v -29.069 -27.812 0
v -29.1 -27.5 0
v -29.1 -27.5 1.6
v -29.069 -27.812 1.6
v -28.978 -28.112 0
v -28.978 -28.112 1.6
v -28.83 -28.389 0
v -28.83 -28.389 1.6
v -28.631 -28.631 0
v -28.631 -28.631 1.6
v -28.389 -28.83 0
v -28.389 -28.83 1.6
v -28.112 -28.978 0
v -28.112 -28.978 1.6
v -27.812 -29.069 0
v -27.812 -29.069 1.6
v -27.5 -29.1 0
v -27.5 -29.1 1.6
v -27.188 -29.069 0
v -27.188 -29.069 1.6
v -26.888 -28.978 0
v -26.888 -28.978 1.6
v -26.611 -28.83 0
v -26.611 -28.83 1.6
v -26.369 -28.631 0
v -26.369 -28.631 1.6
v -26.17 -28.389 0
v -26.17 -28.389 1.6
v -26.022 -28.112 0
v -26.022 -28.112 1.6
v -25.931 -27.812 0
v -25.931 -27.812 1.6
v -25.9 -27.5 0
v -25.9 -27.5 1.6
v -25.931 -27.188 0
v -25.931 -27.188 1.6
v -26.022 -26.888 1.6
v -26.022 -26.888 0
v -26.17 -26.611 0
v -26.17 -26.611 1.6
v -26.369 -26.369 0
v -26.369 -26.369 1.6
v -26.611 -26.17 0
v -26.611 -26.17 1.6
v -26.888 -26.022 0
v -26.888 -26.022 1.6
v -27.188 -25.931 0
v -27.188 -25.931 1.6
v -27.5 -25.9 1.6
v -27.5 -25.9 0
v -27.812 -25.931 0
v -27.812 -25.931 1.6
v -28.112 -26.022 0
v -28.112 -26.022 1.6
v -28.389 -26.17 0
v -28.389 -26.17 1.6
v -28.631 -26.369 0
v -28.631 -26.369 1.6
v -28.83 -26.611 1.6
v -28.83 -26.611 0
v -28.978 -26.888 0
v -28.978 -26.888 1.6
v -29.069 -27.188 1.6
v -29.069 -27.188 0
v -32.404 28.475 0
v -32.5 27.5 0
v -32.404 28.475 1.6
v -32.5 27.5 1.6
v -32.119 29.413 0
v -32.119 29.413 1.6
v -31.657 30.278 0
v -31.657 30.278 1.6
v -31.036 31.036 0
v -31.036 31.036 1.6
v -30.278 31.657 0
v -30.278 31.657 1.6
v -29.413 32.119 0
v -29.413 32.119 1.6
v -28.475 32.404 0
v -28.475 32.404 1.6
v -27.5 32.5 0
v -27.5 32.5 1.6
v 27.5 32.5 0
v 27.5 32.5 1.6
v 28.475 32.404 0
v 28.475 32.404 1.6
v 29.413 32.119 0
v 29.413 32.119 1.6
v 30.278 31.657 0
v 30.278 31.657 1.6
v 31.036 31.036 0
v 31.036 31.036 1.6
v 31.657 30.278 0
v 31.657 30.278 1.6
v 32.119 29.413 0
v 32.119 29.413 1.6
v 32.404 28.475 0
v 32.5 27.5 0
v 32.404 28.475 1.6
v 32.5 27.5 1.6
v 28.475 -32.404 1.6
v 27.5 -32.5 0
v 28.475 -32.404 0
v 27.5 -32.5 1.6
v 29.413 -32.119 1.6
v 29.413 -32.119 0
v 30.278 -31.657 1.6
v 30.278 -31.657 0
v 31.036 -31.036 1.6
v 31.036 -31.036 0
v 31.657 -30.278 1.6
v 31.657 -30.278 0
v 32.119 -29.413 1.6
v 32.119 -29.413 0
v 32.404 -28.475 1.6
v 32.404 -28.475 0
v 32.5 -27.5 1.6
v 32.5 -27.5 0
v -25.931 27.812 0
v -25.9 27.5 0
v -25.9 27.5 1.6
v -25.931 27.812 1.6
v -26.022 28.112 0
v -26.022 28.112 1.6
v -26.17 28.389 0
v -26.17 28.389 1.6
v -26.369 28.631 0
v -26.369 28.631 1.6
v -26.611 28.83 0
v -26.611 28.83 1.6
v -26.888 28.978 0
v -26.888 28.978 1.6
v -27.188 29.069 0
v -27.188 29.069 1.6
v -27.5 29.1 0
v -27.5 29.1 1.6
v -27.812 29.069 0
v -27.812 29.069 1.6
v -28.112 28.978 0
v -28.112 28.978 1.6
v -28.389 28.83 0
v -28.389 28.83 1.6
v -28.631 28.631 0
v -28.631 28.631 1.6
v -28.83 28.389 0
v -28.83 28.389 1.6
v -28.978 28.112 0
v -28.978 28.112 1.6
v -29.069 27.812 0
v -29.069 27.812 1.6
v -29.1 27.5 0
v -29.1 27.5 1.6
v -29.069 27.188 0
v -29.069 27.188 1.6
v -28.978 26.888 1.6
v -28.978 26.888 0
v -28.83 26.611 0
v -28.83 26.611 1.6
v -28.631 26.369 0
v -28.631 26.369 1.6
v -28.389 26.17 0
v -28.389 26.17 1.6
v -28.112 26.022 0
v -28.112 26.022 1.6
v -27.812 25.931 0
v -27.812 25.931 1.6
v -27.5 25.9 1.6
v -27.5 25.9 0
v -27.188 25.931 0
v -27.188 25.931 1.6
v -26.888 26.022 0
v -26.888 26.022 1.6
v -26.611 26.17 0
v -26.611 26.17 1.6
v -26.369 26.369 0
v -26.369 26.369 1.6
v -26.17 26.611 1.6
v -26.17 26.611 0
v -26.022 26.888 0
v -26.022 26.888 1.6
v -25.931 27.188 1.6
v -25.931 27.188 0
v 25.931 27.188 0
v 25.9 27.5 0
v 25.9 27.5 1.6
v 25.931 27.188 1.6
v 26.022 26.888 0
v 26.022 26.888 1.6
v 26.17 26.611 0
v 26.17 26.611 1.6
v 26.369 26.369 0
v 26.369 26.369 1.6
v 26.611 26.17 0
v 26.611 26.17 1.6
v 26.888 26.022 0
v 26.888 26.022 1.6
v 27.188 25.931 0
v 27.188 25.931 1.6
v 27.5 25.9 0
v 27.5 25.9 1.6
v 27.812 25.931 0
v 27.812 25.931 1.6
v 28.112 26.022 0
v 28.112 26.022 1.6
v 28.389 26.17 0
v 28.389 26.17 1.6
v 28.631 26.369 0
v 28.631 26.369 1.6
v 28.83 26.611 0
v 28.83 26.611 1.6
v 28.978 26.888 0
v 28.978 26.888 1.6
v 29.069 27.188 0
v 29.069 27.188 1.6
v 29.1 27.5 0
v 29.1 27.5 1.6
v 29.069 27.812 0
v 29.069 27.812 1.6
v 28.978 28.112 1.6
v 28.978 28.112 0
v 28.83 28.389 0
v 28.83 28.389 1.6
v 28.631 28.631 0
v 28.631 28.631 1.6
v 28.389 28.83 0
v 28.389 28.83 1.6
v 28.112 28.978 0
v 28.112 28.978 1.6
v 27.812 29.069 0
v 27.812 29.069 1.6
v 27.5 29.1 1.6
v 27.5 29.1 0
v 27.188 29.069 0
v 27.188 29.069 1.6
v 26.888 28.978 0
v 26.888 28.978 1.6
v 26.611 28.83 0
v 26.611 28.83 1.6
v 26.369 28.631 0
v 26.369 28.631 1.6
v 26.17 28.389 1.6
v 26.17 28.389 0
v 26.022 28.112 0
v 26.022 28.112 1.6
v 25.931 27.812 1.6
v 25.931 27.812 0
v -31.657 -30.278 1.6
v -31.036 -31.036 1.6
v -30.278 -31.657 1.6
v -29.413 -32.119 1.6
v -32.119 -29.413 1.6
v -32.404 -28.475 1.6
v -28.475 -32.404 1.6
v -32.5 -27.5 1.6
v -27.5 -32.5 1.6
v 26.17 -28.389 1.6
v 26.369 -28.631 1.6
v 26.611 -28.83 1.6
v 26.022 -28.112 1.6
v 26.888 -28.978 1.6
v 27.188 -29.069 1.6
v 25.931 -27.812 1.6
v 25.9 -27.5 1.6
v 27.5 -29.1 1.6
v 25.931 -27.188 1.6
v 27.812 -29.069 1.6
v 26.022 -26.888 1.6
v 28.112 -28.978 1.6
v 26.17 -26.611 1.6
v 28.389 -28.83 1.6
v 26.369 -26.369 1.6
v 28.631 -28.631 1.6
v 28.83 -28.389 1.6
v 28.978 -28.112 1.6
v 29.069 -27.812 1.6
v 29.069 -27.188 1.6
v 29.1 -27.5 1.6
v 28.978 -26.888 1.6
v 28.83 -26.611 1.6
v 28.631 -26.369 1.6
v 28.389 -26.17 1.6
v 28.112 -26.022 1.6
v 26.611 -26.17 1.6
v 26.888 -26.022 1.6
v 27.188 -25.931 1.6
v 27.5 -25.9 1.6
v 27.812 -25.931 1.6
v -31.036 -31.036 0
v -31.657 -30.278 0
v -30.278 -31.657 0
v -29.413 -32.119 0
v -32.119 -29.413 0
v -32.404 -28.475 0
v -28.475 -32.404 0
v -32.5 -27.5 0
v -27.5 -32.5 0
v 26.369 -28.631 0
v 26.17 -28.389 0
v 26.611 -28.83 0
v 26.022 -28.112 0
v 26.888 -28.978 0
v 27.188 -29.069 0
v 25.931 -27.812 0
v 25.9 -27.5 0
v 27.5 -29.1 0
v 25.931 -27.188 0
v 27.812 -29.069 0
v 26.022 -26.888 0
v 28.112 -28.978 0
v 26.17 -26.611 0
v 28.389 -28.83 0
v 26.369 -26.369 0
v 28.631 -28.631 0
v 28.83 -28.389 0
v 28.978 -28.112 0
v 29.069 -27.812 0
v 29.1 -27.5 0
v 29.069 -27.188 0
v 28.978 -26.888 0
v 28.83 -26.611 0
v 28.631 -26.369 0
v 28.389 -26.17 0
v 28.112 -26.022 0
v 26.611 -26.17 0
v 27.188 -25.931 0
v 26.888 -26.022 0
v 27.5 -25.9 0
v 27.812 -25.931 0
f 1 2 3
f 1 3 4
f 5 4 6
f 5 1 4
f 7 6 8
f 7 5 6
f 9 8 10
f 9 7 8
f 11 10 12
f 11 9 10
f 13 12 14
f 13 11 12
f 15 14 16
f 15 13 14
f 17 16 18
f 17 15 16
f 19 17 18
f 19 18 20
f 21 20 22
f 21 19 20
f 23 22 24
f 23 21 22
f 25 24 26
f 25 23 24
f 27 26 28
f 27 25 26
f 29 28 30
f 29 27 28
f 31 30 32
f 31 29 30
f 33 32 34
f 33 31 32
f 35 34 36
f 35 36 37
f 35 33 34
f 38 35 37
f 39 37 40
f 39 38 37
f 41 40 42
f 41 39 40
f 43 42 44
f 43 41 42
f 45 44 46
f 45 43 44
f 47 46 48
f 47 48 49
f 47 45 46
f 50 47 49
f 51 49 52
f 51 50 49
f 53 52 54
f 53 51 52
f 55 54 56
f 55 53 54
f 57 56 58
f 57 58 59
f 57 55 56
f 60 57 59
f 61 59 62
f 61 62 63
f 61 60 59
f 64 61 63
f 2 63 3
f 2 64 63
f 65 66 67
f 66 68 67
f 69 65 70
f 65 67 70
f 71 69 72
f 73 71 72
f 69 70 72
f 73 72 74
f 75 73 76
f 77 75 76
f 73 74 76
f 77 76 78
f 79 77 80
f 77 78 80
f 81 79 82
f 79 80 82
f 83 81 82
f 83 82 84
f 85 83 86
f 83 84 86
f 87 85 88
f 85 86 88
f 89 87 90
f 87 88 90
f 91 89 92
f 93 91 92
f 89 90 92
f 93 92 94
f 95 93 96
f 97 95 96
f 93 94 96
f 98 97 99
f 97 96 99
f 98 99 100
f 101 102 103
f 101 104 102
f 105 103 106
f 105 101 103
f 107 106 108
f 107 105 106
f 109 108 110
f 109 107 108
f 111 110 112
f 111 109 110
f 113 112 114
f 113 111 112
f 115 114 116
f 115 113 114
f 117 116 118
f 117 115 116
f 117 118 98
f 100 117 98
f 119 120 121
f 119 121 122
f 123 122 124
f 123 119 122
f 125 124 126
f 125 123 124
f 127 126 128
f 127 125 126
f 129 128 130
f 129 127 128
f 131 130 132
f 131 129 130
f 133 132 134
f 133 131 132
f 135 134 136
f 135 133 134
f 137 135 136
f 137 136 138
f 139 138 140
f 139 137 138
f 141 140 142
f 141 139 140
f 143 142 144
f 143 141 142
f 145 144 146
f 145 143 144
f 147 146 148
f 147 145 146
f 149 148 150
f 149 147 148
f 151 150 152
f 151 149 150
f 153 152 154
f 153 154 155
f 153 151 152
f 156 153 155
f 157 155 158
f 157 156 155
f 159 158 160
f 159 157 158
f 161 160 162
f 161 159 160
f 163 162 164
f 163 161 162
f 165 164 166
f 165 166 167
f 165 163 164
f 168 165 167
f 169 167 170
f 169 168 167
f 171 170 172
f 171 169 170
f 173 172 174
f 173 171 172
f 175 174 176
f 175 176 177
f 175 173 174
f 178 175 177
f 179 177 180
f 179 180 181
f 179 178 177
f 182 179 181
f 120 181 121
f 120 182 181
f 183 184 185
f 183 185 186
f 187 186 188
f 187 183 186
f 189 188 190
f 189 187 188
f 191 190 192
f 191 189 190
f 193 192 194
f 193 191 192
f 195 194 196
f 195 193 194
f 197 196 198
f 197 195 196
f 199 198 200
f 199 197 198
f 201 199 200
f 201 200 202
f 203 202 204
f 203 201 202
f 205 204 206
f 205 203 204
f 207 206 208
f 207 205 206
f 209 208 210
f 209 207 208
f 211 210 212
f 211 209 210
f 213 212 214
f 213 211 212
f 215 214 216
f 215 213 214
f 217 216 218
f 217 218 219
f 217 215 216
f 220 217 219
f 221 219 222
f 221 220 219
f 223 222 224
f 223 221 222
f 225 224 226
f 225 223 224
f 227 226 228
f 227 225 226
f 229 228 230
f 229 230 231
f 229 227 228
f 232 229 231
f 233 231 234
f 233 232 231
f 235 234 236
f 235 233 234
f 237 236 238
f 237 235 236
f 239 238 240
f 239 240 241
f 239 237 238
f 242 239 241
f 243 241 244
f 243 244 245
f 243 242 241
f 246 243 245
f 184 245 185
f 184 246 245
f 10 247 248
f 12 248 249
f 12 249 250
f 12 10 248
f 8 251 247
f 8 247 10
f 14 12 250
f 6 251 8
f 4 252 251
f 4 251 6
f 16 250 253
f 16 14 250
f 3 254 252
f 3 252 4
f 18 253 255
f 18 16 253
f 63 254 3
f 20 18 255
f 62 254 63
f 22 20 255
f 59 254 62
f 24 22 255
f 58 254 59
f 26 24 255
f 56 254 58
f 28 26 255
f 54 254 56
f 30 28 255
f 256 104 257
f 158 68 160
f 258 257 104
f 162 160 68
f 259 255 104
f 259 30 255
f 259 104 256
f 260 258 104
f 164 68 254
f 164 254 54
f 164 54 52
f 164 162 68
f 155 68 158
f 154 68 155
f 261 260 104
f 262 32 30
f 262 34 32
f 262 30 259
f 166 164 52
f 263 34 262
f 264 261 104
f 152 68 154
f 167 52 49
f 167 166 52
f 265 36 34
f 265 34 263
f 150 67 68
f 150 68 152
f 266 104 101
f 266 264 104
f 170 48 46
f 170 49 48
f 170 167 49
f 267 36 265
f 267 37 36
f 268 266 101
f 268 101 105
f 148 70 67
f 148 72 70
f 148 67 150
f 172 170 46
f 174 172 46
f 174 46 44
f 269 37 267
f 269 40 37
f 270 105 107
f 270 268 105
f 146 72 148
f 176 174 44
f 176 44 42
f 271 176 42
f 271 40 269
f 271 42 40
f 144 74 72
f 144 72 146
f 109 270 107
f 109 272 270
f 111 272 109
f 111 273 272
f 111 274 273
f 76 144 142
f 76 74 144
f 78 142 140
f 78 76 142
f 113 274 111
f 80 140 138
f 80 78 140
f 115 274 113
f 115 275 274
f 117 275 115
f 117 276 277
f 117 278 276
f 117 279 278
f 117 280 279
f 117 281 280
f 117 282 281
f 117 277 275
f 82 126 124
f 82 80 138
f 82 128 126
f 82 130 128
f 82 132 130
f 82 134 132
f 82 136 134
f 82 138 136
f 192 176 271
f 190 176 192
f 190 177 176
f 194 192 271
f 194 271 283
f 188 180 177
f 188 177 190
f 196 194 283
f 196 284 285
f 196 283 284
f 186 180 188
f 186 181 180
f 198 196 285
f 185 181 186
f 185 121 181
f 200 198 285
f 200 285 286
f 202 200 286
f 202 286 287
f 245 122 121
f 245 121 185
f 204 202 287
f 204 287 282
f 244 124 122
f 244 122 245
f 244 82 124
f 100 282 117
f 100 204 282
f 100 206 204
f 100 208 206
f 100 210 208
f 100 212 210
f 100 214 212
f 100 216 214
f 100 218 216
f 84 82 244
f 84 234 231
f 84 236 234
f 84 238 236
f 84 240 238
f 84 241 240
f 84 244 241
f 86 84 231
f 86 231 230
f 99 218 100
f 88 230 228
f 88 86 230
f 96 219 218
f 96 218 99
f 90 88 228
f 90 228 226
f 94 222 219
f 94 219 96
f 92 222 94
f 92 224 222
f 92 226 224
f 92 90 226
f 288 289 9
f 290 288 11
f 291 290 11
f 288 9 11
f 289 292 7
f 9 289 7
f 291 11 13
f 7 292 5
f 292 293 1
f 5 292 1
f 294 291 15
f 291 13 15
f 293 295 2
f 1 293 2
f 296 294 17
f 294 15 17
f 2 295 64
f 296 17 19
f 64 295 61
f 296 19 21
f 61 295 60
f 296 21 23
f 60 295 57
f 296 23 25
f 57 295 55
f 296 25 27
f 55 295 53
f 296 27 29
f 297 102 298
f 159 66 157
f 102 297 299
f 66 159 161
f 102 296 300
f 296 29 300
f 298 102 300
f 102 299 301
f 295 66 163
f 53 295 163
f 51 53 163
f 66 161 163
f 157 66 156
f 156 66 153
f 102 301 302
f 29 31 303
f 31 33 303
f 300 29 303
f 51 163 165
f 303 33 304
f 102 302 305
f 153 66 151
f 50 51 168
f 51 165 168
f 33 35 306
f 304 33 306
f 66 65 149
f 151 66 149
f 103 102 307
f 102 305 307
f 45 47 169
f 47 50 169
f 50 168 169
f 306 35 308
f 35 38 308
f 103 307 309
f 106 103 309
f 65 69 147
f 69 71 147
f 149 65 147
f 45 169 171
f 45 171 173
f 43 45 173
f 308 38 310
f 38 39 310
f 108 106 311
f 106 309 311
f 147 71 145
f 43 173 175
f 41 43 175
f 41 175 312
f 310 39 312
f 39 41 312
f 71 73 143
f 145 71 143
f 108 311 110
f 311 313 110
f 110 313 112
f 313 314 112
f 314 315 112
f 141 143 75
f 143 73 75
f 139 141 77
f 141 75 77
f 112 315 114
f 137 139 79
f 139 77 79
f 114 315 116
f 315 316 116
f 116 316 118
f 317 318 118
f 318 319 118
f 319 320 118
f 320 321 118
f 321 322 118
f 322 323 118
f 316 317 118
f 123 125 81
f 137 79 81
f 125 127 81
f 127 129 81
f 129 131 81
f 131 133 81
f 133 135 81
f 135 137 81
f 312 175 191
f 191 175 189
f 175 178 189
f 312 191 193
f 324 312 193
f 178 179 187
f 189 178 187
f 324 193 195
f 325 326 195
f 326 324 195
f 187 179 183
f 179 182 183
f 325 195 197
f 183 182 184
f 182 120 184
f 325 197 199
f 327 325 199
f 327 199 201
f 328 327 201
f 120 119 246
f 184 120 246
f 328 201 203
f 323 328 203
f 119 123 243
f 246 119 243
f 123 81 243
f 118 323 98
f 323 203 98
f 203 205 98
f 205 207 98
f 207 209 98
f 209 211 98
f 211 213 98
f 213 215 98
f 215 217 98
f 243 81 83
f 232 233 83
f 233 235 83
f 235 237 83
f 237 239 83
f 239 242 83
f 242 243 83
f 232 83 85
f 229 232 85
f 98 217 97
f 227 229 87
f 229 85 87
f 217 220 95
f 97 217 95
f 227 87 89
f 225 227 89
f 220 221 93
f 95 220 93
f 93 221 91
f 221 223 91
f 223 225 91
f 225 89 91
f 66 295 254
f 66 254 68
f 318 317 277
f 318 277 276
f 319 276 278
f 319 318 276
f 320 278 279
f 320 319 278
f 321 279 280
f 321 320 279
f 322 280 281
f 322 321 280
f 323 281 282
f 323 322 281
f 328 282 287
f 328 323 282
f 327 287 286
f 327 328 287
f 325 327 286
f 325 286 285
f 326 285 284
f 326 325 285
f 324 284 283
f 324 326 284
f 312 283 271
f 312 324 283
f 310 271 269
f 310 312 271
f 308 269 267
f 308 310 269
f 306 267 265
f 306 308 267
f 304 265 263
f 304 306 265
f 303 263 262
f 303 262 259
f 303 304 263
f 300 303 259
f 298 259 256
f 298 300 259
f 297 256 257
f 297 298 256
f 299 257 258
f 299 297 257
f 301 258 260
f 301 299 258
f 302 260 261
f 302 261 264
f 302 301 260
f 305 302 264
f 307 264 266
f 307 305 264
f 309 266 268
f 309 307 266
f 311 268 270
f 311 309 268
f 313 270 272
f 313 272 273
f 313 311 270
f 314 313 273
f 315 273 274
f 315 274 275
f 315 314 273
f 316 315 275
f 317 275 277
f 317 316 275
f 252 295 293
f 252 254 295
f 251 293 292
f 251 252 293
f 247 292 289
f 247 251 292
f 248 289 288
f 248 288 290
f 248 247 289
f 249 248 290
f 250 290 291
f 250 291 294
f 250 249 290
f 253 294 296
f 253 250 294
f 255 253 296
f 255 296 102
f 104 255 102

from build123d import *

# Parameters (mm, degrees)
SKETCH_1_W      = 65
SKETCH_1_H      = 65
SKETCH_1_R      = 1.6
EXTRUDE_1_DEPTH = 1.6
FILLET_1_R      = 5


with BuildPart() as part:
    # ｽｹｯﾁ1 → ﾎﾞｽ - 押し出し1 (new body)
    with BuildSketch(Plane.XY):
        Rectangle(SKETCH_1_W, SKETCH_1_H)
        with Locations((-27.5, 27.5)):
            Circle(SKETCH_1_R, mode=Mode.SUBTRACT)
        with Locations(Location((27.5, 27.5, 0), (0, 0, 180))):
            Circle(SKETCH_1_R, mode=Mode.SUBTRACT)
        with Locations(Location((-27.5, -27.5, 0), (0, 0, 180))):
            Circle(SKETCH_1_R, mode=Mode.SUBTRACT)
        with Locations((27.5, -27.5)):
            Circle(SKETCH_1_R, mode=Mode.SUBTRACT)
    extrude(amount=EXTRUDE_1_DEPTH)

    # ﾌｨﾚｯﾄ1
    fillet_1_edges = [part.edges().sort_by_distance(p)[0] for p in [
        (-32.5, 32.5, 0.8),
        (32.5, 32.5, 0.8),
        (32.5, -32.5, 0.8),
        (-32.5, -32.5, 0.8),
    ]]
    fillet(fillet_1_edges, radius=FILLET_1_R)


solid = part.part
